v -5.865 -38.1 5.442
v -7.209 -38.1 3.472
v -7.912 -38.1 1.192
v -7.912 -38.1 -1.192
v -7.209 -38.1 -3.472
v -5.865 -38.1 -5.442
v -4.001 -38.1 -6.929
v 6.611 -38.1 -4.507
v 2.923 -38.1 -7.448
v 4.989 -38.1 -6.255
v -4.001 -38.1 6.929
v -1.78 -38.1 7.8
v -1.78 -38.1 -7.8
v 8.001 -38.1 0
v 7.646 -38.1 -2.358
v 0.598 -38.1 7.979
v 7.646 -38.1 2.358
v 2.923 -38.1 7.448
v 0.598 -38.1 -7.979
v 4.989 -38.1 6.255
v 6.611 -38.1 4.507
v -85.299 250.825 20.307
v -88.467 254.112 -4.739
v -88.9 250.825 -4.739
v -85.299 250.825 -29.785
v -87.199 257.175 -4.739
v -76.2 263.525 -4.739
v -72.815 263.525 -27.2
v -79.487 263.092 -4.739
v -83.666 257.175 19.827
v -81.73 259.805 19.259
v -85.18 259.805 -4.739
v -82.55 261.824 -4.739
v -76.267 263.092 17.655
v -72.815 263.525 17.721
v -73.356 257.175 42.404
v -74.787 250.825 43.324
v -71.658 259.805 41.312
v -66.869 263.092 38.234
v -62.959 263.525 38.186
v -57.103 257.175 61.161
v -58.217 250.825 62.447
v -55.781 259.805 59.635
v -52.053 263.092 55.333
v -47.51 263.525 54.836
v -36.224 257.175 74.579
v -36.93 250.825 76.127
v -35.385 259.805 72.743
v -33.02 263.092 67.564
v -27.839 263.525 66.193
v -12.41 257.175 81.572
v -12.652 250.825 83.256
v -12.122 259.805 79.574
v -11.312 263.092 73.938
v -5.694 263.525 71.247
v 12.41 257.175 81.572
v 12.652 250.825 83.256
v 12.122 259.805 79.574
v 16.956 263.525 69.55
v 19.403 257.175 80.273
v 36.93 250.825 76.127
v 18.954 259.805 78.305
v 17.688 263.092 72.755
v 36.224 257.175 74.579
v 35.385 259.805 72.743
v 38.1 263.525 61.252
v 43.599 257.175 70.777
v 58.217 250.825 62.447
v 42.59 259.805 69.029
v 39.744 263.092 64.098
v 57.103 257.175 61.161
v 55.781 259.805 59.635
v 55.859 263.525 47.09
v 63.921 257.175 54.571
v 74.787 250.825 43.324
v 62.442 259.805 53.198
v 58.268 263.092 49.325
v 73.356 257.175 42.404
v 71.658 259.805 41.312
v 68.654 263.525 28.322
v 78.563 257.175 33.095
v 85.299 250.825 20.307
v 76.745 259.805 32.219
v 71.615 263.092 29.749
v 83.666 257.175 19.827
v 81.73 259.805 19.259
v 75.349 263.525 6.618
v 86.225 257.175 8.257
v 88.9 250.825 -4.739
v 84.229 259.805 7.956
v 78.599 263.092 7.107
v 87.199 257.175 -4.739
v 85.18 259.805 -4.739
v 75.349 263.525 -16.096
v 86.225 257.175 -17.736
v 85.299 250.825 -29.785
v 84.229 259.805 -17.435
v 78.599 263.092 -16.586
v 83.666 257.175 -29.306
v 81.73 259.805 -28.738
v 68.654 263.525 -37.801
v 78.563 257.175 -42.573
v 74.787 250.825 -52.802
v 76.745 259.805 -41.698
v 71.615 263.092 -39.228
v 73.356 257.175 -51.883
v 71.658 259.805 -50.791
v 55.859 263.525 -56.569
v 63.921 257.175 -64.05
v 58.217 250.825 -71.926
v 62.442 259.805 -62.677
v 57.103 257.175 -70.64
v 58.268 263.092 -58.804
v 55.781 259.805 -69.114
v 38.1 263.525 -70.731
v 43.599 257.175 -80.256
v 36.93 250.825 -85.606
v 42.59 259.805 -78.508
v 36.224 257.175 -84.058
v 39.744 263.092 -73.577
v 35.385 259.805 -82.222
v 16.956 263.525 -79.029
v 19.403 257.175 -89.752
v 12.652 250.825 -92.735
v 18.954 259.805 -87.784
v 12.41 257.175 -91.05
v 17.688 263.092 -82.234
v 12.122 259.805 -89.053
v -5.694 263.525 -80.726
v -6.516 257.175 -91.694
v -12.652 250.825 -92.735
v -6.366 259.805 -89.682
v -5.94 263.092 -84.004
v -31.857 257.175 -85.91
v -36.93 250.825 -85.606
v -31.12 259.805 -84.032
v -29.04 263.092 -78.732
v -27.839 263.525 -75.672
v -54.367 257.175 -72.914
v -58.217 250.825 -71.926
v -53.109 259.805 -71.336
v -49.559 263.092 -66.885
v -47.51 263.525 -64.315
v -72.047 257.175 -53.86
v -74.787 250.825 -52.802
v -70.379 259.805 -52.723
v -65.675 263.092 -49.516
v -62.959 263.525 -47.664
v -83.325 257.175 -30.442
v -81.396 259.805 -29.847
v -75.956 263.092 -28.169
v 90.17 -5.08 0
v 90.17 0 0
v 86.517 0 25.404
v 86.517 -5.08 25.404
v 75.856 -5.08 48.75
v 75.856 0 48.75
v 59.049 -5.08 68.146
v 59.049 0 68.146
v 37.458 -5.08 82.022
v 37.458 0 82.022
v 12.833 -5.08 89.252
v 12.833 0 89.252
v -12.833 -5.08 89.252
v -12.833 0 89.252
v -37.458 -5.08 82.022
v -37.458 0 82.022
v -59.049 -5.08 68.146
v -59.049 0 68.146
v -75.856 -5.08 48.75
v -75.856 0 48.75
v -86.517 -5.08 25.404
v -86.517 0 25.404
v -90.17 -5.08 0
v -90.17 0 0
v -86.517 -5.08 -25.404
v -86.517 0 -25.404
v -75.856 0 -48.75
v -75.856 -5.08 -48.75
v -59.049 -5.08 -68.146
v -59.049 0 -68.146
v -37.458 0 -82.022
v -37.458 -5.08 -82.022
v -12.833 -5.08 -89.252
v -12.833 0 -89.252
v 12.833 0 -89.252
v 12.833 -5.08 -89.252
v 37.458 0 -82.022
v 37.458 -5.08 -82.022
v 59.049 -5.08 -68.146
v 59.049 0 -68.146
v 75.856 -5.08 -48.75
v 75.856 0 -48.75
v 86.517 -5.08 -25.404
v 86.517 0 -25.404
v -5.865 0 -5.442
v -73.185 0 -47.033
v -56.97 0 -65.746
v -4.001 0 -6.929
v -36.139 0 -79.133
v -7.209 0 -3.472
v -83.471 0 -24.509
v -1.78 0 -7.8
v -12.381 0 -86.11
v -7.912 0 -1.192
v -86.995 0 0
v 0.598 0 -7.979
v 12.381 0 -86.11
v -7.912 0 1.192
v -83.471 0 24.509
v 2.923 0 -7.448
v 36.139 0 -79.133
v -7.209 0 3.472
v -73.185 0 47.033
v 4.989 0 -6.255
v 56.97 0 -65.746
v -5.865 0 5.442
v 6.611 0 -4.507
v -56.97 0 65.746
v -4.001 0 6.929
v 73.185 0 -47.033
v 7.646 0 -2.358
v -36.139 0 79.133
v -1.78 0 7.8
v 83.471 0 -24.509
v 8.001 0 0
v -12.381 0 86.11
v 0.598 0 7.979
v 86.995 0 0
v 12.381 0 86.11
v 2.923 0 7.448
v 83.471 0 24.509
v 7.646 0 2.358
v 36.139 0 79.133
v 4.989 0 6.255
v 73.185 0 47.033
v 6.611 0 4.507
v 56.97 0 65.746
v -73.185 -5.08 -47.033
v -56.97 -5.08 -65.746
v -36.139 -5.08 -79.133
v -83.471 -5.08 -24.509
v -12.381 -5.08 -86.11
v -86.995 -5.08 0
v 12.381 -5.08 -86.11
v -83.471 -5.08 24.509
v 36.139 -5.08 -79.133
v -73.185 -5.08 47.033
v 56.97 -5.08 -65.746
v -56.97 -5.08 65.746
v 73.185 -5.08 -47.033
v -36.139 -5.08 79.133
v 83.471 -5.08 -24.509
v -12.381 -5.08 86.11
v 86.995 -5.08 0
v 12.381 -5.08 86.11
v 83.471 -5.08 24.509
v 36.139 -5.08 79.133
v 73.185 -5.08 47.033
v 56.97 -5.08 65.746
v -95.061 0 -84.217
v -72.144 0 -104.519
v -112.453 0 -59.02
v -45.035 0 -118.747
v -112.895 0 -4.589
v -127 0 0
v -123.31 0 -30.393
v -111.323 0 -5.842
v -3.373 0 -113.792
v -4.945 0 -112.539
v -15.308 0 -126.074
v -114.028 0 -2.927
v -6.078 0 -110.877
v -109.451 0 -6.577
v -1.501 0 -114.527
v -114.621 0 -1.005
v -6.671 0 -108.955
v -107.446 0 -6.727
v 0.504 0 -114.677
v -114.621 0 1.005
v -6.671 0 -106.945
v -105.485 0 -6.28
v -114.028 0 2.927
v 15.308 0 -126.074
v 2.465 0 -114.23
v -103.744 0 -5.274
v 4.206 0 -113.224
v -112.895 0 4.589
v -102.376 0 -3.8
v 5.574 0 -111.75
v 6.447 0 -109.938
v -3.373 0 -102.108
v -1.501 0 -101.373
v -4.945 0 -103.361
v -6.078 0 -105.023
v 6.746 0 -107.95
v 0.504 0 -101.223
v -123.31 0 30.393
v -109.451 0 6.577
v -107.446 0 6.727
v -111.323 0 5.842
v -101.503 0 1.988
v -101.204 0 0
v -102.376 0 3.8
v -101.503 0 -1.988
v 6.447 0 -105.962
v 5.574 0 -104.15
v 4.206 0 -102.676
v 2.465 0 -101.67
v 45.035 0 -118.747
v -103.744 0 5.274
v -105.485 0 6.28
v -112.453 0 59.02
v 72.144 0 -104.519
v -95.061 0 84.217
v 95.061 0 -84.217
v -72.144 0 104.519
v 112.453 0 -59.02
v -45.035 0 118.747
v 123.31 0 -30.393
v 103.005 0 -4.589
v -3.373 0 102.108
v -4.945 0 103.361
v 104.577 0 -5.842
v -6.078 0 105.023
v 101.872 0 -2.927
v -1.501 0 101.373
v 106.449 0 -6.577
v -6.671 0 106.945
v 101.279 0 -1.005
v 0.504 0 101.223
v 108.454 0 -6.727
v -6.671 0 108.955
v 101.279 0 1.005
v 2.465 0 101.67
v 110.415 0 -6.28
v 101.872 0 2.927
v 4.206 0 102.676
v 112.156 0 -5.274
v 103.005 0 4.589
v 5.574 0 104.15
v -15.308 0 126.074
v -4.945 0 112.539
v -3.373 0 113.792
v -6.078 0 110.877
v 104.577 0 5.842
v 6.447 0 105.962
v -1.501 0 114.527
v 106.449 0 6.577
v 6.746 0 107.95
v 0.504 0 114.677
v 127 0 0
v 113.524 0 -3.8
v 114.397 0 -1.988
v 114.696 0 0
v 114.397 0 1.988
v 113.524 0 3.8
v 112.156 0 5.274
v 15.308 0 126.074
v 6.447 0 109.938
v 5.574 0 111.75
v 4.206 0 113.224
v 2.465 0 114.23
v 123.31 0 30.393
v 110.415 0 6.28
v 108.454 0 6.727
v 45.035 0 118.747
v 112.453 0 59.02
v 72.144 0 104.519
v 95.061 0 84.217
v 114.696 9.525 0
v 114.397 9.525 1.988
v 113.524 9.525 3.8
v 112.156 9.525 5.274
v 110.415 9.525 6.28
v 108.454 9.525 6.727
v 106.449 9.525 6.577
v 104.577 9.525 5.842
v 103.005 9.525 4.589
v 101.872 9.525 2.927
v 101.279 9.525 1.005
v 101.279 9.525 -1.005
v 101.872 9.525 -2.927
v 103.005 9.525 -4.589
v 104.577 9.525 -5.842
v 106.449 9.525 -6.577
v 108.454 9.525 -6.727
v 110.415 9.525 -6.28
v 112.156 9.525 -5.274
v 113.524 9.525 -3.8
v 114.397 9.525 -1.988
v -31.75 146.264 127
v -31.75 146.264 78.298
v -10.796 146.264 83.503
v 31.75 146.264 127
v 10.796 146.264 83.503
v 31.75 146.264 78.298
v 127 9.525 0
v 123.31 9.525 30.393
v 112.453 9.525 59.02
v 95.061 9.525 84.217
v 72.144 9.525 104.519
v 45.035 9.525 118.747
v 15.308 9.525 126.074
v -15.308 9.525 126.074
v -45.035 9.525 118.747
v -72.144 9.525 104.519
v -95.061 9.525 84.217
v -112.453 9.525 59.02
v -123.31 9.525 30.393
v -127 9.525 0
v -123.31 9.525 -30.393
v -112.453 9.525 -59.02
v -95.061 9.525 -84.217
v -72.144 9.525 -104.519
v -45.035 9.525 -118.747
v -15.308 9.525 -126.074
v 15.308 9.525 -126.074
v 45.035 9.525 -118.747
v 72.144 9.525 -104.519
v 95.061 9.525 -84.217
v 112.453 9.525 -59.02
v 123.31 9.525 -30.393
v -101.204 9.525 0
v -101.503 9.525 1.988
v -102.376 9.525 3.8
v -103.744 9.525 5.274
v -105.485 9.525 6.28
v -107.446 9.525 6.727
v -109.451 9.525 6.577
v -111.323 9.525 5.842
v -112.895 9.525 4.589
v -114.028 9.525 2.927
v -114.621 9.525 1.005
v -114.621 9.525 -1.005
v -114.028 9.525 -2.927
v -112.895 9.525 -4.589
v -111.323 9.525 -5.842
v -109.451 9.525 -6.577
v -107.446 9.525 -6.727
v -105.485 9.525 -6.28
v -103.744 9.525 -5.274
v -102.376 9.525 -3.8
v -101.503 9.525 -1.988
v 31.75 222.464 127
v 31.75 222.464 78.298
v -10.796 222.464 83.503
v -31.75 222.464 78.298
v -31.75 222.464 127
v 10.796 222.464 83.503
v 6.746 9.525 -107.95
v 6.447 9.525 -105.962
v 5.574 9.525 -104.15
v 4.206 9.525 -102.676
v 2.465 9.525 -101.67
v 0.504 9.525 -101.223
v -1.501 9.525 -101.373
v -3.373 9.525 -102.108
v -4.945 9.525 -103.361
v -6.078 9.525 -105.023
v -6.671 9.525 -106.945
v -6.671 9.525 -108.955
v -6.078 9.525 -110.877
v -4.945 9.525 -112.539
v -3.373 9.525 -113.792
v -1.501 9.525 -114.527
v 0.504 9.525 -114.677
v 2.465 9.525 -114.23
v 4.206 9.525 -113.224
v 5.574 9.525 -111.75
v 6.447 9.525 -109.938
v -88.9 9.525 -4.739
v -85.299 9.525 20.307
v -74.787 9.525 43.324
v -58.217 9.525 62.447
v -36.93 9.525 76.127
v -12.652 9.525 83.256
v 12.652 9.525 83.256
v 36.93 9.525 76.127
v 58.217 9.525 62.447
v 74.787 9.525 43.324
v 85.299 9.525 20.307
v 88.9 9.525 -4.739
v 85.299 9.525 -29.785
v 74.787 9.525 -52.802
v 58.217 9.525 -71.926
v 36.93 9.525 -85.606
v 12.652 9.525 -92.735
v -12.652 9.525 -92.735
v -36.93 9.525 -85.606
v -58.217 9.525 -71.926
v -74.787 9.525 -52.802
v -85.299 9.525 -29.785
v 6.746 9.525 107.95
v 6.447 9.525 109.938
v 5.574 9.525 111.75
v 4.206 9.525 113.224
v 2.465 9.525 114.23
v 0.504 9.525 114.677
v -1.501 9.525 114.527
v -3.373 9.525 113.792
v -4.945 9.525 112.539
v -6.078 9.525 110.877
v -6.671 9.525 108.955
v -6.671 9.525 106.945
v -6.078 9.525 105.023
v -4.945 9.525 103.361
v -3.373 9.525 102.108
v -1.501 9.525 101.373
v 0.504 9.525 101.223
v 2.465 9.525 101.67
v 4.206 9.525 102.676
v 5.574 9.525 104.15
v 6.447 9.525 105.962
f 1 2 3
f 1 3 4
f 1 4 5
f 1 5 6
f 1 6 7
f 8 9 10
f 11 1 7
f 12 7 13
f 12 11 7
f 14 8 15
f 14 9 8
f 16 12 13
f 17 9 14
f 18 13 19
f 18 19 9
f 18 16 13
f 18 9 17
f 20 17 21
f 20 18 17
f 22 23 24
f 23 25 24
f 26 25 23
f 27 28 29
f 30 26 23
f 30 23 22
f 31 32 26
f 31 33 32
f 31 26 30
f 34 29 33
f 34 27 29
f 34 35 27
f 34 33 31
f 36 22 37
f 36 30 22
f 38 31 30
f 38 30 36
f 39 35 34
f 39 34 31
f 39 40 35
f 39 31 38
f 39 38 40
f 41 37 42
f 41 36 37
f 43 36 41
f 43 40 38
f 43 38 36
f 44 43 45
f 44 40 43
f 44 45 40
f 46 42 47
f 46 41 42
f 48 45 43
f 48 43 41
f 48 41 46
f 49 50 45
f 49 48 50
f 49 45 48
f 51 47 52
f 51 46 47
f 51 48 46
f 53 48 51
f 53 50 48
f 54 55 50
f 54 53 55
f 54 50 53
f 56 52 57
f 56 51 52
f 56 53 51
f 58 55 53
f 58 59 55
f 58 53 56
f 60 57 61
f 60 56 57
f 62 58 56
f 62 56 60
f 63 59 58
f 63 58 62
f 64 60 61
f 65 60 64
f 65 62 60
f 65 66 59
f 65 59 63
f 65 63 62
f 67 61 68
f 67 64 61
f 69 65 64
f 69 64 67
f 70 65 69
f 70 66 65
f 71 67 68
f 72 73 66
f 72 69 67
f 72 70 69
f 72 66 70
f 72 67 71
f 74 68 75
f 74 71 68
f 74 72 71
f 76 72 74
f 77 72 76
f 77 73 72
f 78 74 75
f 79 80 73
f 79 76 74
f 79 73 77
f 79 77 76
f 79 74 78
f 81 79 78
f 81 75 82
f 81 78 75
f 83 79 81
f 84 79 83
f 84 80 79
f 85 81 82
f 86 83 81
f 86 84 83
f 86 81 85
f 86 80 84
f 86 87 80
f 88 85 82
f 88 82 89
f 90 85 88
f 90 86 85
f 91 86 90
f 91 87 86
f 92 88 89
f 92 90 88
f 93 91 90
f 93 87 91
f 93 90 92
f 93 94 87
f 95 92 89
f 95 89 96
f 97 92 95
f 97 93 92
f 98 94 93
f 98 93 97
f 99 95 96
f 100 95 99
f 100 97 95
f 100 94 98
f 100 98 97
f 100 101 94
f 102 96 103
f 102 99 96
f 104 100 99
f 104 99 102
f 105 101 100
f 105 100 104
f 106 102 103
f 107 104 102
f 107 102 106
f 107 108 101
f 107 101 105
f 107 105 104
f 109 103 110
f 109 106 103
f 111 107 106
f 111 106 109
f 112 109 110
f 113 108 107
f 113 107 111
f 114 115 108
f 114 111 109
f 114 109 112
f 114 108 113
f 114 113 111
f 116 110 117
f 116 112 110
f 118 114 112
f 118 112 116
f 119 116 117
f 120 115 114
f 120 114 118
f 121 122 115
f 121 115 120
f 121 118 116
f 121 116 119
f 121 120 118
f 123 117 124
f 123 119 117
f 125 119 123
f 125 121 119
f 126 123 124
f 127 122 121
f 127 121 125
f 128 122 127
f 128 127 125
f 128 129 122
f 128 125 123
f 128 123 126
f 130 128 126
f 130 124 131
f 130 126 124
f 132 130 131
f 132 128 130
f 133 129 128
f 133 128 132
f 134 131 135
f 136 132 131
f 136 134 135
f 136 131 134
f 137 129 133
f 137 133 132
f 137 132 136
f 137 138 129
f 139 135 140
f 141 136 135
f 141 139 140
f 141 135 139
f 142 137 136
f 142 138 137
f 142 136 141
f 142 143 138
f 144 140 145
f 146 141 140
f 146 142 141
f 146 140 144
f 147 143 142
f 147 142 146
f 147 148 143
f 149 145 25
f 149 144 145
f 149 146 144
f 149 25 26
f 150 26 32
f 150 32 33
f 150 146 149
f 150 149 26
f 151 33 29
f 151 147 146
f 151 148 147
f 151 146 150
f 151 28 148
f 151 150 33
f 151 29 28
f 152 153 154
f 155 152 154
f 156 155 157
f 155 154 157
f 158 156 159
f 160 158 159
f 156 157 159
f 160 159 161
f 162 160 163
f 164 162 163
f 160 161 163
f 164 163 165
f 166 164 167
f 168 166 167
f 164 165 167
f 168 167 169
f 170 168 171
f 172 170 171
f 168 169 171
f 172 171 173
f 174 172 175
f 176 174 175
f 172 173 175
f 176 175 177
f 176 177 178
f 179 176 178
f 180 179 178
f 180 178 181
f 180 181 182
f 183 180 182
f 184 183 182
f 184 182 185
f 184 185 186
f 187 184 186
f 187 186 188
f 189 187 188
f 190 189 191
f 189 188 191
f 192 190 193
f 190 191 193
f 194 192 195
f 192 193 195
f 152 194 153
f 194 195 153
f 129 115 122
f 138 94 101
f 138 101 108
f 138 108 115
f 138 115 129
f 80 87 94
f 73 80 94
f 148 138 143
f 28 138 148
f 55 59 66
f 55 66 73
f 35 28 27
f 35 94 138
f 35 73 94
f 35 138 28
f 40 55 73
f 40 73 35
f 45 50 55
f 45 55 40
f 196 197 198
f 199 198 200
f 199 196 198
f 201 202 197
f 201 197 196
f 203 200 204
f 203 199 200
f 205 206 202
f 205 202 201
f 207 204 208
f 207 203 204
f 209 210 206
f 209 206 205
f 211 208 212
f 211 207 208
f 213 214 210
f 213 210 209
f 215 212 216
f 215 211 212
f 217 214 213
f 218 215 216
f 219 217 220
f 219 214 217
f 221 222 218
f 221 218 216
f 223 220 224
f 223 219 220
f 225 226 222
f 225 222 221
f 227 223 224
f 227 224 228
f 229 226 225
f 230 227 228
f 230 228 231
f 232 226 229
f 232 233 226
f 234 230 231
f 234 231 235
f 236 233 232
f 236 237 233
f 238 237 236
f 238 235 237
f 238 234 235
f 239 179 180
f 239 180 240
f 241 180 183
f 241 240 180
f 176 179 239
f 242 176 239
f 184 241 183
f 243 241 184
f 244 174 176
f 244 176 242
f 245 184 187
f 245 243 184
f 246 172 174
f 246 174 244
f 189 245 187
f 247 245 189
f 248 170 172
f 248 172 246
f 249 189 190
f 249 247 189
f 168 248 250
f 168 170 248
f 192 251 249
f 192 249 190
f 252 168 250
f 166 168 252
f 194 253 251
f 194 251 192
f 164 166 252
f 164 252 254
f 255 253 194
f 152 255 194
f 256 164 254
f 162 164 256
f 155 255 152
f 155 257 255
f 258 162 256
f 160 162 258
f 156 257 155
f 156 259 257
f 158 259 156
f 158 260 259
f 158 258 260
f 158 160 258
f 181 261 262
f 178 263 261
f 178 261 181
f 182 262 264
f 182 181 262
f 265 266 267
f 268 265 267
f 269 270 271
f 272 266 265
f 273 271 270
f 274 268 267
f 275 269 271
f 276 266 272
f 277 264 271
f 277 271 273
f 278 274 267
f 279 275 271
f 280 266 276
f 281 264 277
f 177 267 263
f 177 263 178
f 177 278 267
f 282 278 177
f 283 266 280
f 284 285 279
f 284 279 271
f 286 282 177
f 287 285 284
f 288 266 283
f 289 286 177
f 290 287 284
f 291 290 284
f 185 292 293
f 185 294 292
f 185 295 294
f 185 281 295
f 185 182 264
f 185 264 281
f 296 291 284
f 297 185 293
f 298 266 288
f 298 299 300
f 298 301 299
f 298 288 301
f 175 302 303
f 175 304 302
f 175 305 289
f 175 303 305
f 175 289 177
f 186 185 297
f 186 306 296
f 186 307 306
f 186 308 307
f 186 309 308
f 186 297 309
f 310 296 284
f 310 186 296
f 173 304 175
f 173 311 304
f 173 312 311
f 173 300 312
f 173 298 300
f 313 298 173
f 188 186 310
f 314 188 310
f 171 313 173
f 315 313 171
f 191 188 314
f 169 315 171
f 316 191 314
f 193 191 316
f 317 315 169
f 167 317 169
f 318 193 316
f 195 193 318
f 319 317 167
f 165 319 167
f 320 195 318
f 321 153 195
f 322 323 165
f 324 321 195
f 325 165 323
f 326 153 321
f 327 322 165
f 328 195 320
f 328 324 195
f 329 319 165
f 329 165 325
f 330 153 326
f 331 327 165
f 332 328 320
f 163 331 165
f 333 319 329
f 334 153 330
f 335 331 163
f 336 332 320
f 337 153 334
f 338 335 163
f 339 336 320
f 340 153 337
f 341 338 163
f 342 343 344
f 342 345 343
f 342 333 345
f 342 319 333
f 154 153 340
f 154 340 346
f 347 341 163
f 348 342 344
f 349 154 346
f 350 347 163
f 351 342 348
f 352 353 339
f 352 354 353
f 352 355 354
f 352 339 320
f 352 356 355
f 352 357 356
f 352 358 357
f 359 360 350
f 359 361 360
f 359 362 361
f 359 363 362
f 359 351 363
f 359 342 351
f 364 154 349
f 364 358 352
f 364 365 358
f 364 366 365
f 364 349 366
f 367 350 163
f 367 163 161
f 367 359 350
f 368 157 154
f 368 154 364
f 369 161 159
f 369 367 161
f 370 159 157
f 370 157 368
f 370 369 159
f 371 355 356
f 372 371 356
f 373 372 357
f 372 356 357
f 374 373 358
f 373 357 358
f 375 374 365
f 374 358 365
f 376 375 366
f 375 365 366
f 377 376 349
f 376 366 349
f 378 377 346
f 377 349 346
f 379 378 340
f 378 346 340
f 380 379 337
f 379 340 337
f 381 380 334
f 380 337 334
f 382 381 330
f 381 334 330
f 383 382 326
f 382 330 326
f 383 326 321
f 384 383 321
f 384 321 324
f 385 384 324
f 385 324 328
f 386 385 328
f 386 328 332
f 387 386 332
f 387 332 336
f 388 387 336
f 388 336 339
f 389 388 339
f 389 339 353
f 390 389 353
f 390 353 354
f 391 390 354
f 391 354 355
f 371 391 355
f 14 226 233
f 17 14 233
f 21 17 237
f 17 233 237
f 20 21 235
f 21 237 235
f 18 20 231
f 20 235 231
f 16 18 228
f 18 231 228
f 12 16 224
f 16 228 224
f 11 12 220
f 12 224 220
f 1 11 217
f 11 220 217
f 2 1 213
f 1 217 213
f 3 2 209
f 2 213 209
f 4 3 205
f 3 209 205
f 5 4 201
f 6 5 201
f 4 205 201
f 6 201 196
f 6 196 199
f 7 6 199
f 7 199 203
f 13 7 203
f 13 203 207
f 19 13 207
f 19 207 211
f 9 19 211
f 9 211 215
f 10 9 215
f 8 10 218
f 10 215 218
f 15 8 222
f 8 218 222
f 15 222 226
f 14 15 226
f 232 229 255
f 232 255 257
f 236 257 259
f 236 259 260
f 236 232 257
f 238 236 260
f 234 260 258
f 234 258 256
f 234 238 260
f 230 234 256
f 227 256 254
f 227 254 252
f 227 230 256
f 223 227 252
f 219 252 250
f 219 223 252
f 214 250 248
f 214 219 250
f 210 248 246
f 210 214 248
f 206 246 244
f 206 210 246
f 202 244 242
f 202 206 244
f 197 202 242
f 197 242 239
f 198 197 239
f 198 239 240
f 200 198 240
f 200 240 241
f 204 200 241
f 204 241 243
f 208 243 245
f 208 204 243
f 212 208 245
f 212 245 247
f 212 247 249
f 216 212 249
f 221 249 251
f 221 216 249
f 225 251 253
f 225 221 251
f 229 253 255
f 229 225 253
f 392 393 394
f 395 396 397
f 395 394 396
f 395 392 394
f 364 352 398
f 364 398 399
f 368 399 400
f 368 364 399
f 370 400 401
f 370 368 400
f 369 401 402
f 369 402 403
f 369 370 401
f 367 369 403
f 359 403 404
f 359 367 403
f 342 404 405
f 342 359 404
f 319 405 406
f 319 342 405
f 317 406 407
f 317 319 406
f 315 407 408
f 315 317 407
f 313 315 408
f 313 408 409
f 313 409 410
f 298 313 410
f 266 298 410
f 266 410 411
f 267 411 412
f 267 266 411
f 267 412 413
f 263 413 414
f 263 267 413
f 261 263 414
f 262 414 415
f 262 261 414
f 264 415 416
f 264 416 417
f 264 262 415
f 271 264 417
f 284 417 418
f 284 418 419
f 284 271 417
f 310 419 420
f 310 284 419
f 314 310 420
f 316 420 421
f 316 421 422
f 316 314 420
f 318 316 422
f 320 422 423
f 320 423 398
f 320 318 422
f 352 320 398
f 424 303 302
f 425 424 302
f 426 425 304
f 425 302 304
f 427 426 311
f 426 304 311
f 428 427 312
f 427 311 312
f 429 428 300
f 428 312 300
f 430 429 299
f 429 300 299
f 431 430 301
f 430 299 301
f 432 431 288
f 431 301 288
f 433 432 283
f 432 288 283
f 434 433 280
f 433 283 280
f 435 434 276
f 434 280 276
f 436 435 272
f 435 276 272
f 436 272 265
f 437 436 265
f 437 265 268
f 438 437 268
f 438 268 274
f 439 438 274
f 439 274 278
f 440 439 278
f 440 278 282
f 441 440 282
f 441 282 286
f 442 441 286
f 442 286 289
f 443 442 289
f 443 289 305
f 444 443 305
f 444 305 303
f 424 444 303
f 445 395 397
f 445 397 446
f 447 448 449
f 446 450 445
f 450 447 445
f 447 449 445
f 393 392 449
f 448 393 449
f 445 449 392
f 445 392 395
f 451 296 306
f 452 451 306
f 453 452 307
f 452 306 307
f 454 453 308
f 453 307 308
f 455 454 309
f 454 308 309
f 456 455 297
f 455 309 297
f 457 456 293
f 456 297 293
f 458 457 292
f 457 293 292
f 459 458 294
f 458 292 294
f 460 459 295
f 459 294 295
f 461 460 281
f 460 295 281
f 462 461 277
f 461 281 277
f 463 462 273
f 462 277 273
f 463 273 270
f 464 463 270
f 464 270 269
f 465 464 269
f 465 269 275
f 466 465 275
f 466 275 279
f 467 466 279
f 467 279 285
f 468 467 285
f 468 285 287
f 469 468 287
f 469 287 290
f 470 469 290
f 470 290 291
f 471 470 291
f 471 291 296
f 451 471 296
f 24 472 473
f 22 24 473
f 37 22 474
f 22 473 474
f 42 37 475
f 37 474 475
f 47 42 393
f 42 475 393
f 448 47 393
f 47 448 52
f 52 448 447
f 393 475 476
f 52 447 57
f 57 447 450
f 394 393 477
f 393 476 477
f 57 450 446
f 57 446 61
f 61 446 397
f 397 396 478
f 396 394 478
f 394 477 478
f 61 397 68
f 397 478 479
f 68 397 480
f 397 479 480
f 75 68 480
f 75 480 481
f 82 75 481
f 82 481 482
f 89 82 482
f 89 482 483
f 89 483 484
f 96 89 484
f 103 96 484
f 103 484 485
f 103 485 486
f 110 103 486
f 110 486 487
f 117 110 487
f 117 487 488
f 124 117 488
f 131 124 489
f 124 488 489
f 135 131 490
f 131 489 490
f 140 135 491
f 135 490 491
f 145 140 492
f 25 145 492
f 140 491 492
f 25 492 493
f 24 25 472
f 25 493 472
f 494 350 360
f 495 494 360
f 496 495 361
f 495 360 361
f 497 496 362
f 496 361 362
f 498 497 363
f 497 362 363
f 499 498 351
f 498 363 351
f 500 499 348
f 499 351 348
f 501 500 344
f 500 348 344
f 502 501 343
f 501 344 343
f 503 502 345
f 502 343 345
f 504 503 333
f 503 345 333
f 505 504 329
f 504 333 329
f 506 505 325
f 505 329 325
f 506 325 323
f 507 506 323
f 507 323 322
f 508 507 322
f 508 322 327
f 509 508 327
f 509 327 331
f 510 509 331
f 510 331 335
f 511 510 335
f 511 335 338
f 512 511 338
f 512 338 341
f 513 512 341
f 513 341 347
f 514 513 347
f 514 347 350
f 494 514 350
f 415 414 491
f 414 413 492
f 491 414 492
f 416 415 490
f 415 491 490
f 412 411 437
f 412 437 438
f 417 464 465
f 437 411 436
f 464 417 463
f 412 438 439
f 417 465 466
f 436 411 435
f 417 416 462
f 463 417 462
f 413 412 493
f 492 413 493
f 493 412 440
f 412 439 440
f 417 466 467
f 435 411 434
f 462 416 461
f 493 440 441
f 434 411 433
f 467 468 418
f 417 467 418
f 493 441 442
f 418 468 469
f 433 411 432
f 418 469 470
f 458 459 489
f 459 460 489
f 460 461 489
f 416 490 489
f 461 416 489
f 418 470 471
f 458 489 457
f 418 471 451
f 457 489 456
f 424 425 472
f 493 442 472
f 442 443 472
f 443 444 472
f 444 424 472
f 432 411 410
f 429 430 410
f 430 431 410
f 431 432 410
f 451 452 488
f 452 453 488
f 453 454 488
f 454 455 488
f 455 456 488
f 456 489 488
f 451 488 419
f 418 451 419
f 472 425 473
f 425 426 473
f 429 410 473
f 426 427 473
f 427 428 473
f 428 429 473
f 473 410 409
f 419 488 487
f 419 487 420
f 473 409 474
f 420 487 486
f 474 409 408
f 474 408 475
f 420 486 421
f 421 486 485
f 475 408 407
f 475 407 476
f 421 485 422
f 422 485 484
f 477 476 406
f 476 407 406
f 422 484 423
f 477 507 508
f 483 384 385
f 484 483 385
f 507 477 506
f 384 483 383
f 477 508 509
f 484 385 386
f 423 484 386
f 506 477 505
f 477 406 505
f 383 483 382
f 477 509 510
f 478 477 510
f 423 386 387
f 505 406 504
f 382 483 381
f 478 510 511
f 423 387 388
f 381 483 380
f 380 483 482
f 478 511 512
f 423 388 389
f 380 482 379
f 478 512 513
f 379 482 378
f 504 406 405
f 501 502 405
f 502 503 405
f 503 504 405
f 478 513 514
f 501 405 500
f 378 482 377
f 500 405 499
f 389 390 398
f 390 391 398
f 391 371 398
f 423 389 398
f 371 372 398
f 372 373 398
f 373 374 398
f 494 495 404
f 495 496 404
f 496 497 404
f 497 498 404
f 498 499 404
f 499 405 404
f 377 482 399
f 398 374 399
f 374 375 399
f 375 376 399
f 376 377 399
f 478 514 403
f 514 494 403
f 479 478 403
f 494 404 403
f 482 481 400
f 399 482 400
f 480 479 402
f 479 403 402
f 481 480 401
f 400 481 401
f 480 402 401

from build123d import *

# Parameters (mm, degrees)
F0_R      = 127
F1_DEPTH  = 9.525
F2_R      = 88.9
F3_DEPTH  = 254
F5_W      = 63.5
F5_H      = 76.2
F6_DEPTH  = 76.2
F7_R      = 6.74624
F8_DEPTH  = 25.4
F9_R      = 12.7
F10_R     = 90.17
F10_R_2   = 86.995
F11_DEPTH = 5.08
F12_R     = 8.001
F13_DEPTH = 38.1


with BuildPart() as f1:
    # F0 (on Front) → F1 (new body)
    with BuildSketch(Plane.XZ):
        Circle(F0_R)
    extrude(amount=-F1_DEPTH)

    # F2 (on face) → F3 (join)
    with BuildSketch(Plane(origin=(0, 9.525, 0), x_dir=(-1, 0, 0), z_dir=(0, 1, 0))):
        with Locations((0, -4.739449)):
            Circle(F2_R)
    extrude(amount=F3_DEPTH)

    # F5 (on offset) → F6 (join)
    with BuildSketch(Plane.XY.offset(127)):
        with Locations((0, 184.363604)):
            Rectangle(F5_W, F5_H)
    extrude(amount=-F6_DEPTH)

    # F7 (on face) → F8 (cut)
    with BuildSketch(Plane.XZ):
        with Locations((107.95, 0)):
            Circle(F7_R)
        with Locations((0, 107.95)):
            Circle(F7_R)
        with Locations((-107.95, 0)):
            Circle(F7_R)
        with Locations((0, -107.95)):
            Circle(F7_R)
    extrude(amount=-F8_DEPTH, mode=Mode.SUBTRACT)

    # F9
    f9_edges = [f1.edges().sort_by_distance(p)[0] for p in [
        (88.9, 263.525, -4.739449),
    ]]
    fillet(f9_edges, radius=F9_R)

    # F10 (on face) → F11 (join)
    with BuildSketch(Plane.XZ):
        Circle(F10_R)
        Circle(F10_R_2, mode=Mode.SUBTRACT)
    extrude(amount=F11_DEPTH)

    # F12 (on face) → F13 (join)
    with BuildSketch(Plane.XZ):
        Circle(F12_R)
    extrude(amount=F13_DEPTH)


solid = f1.part
